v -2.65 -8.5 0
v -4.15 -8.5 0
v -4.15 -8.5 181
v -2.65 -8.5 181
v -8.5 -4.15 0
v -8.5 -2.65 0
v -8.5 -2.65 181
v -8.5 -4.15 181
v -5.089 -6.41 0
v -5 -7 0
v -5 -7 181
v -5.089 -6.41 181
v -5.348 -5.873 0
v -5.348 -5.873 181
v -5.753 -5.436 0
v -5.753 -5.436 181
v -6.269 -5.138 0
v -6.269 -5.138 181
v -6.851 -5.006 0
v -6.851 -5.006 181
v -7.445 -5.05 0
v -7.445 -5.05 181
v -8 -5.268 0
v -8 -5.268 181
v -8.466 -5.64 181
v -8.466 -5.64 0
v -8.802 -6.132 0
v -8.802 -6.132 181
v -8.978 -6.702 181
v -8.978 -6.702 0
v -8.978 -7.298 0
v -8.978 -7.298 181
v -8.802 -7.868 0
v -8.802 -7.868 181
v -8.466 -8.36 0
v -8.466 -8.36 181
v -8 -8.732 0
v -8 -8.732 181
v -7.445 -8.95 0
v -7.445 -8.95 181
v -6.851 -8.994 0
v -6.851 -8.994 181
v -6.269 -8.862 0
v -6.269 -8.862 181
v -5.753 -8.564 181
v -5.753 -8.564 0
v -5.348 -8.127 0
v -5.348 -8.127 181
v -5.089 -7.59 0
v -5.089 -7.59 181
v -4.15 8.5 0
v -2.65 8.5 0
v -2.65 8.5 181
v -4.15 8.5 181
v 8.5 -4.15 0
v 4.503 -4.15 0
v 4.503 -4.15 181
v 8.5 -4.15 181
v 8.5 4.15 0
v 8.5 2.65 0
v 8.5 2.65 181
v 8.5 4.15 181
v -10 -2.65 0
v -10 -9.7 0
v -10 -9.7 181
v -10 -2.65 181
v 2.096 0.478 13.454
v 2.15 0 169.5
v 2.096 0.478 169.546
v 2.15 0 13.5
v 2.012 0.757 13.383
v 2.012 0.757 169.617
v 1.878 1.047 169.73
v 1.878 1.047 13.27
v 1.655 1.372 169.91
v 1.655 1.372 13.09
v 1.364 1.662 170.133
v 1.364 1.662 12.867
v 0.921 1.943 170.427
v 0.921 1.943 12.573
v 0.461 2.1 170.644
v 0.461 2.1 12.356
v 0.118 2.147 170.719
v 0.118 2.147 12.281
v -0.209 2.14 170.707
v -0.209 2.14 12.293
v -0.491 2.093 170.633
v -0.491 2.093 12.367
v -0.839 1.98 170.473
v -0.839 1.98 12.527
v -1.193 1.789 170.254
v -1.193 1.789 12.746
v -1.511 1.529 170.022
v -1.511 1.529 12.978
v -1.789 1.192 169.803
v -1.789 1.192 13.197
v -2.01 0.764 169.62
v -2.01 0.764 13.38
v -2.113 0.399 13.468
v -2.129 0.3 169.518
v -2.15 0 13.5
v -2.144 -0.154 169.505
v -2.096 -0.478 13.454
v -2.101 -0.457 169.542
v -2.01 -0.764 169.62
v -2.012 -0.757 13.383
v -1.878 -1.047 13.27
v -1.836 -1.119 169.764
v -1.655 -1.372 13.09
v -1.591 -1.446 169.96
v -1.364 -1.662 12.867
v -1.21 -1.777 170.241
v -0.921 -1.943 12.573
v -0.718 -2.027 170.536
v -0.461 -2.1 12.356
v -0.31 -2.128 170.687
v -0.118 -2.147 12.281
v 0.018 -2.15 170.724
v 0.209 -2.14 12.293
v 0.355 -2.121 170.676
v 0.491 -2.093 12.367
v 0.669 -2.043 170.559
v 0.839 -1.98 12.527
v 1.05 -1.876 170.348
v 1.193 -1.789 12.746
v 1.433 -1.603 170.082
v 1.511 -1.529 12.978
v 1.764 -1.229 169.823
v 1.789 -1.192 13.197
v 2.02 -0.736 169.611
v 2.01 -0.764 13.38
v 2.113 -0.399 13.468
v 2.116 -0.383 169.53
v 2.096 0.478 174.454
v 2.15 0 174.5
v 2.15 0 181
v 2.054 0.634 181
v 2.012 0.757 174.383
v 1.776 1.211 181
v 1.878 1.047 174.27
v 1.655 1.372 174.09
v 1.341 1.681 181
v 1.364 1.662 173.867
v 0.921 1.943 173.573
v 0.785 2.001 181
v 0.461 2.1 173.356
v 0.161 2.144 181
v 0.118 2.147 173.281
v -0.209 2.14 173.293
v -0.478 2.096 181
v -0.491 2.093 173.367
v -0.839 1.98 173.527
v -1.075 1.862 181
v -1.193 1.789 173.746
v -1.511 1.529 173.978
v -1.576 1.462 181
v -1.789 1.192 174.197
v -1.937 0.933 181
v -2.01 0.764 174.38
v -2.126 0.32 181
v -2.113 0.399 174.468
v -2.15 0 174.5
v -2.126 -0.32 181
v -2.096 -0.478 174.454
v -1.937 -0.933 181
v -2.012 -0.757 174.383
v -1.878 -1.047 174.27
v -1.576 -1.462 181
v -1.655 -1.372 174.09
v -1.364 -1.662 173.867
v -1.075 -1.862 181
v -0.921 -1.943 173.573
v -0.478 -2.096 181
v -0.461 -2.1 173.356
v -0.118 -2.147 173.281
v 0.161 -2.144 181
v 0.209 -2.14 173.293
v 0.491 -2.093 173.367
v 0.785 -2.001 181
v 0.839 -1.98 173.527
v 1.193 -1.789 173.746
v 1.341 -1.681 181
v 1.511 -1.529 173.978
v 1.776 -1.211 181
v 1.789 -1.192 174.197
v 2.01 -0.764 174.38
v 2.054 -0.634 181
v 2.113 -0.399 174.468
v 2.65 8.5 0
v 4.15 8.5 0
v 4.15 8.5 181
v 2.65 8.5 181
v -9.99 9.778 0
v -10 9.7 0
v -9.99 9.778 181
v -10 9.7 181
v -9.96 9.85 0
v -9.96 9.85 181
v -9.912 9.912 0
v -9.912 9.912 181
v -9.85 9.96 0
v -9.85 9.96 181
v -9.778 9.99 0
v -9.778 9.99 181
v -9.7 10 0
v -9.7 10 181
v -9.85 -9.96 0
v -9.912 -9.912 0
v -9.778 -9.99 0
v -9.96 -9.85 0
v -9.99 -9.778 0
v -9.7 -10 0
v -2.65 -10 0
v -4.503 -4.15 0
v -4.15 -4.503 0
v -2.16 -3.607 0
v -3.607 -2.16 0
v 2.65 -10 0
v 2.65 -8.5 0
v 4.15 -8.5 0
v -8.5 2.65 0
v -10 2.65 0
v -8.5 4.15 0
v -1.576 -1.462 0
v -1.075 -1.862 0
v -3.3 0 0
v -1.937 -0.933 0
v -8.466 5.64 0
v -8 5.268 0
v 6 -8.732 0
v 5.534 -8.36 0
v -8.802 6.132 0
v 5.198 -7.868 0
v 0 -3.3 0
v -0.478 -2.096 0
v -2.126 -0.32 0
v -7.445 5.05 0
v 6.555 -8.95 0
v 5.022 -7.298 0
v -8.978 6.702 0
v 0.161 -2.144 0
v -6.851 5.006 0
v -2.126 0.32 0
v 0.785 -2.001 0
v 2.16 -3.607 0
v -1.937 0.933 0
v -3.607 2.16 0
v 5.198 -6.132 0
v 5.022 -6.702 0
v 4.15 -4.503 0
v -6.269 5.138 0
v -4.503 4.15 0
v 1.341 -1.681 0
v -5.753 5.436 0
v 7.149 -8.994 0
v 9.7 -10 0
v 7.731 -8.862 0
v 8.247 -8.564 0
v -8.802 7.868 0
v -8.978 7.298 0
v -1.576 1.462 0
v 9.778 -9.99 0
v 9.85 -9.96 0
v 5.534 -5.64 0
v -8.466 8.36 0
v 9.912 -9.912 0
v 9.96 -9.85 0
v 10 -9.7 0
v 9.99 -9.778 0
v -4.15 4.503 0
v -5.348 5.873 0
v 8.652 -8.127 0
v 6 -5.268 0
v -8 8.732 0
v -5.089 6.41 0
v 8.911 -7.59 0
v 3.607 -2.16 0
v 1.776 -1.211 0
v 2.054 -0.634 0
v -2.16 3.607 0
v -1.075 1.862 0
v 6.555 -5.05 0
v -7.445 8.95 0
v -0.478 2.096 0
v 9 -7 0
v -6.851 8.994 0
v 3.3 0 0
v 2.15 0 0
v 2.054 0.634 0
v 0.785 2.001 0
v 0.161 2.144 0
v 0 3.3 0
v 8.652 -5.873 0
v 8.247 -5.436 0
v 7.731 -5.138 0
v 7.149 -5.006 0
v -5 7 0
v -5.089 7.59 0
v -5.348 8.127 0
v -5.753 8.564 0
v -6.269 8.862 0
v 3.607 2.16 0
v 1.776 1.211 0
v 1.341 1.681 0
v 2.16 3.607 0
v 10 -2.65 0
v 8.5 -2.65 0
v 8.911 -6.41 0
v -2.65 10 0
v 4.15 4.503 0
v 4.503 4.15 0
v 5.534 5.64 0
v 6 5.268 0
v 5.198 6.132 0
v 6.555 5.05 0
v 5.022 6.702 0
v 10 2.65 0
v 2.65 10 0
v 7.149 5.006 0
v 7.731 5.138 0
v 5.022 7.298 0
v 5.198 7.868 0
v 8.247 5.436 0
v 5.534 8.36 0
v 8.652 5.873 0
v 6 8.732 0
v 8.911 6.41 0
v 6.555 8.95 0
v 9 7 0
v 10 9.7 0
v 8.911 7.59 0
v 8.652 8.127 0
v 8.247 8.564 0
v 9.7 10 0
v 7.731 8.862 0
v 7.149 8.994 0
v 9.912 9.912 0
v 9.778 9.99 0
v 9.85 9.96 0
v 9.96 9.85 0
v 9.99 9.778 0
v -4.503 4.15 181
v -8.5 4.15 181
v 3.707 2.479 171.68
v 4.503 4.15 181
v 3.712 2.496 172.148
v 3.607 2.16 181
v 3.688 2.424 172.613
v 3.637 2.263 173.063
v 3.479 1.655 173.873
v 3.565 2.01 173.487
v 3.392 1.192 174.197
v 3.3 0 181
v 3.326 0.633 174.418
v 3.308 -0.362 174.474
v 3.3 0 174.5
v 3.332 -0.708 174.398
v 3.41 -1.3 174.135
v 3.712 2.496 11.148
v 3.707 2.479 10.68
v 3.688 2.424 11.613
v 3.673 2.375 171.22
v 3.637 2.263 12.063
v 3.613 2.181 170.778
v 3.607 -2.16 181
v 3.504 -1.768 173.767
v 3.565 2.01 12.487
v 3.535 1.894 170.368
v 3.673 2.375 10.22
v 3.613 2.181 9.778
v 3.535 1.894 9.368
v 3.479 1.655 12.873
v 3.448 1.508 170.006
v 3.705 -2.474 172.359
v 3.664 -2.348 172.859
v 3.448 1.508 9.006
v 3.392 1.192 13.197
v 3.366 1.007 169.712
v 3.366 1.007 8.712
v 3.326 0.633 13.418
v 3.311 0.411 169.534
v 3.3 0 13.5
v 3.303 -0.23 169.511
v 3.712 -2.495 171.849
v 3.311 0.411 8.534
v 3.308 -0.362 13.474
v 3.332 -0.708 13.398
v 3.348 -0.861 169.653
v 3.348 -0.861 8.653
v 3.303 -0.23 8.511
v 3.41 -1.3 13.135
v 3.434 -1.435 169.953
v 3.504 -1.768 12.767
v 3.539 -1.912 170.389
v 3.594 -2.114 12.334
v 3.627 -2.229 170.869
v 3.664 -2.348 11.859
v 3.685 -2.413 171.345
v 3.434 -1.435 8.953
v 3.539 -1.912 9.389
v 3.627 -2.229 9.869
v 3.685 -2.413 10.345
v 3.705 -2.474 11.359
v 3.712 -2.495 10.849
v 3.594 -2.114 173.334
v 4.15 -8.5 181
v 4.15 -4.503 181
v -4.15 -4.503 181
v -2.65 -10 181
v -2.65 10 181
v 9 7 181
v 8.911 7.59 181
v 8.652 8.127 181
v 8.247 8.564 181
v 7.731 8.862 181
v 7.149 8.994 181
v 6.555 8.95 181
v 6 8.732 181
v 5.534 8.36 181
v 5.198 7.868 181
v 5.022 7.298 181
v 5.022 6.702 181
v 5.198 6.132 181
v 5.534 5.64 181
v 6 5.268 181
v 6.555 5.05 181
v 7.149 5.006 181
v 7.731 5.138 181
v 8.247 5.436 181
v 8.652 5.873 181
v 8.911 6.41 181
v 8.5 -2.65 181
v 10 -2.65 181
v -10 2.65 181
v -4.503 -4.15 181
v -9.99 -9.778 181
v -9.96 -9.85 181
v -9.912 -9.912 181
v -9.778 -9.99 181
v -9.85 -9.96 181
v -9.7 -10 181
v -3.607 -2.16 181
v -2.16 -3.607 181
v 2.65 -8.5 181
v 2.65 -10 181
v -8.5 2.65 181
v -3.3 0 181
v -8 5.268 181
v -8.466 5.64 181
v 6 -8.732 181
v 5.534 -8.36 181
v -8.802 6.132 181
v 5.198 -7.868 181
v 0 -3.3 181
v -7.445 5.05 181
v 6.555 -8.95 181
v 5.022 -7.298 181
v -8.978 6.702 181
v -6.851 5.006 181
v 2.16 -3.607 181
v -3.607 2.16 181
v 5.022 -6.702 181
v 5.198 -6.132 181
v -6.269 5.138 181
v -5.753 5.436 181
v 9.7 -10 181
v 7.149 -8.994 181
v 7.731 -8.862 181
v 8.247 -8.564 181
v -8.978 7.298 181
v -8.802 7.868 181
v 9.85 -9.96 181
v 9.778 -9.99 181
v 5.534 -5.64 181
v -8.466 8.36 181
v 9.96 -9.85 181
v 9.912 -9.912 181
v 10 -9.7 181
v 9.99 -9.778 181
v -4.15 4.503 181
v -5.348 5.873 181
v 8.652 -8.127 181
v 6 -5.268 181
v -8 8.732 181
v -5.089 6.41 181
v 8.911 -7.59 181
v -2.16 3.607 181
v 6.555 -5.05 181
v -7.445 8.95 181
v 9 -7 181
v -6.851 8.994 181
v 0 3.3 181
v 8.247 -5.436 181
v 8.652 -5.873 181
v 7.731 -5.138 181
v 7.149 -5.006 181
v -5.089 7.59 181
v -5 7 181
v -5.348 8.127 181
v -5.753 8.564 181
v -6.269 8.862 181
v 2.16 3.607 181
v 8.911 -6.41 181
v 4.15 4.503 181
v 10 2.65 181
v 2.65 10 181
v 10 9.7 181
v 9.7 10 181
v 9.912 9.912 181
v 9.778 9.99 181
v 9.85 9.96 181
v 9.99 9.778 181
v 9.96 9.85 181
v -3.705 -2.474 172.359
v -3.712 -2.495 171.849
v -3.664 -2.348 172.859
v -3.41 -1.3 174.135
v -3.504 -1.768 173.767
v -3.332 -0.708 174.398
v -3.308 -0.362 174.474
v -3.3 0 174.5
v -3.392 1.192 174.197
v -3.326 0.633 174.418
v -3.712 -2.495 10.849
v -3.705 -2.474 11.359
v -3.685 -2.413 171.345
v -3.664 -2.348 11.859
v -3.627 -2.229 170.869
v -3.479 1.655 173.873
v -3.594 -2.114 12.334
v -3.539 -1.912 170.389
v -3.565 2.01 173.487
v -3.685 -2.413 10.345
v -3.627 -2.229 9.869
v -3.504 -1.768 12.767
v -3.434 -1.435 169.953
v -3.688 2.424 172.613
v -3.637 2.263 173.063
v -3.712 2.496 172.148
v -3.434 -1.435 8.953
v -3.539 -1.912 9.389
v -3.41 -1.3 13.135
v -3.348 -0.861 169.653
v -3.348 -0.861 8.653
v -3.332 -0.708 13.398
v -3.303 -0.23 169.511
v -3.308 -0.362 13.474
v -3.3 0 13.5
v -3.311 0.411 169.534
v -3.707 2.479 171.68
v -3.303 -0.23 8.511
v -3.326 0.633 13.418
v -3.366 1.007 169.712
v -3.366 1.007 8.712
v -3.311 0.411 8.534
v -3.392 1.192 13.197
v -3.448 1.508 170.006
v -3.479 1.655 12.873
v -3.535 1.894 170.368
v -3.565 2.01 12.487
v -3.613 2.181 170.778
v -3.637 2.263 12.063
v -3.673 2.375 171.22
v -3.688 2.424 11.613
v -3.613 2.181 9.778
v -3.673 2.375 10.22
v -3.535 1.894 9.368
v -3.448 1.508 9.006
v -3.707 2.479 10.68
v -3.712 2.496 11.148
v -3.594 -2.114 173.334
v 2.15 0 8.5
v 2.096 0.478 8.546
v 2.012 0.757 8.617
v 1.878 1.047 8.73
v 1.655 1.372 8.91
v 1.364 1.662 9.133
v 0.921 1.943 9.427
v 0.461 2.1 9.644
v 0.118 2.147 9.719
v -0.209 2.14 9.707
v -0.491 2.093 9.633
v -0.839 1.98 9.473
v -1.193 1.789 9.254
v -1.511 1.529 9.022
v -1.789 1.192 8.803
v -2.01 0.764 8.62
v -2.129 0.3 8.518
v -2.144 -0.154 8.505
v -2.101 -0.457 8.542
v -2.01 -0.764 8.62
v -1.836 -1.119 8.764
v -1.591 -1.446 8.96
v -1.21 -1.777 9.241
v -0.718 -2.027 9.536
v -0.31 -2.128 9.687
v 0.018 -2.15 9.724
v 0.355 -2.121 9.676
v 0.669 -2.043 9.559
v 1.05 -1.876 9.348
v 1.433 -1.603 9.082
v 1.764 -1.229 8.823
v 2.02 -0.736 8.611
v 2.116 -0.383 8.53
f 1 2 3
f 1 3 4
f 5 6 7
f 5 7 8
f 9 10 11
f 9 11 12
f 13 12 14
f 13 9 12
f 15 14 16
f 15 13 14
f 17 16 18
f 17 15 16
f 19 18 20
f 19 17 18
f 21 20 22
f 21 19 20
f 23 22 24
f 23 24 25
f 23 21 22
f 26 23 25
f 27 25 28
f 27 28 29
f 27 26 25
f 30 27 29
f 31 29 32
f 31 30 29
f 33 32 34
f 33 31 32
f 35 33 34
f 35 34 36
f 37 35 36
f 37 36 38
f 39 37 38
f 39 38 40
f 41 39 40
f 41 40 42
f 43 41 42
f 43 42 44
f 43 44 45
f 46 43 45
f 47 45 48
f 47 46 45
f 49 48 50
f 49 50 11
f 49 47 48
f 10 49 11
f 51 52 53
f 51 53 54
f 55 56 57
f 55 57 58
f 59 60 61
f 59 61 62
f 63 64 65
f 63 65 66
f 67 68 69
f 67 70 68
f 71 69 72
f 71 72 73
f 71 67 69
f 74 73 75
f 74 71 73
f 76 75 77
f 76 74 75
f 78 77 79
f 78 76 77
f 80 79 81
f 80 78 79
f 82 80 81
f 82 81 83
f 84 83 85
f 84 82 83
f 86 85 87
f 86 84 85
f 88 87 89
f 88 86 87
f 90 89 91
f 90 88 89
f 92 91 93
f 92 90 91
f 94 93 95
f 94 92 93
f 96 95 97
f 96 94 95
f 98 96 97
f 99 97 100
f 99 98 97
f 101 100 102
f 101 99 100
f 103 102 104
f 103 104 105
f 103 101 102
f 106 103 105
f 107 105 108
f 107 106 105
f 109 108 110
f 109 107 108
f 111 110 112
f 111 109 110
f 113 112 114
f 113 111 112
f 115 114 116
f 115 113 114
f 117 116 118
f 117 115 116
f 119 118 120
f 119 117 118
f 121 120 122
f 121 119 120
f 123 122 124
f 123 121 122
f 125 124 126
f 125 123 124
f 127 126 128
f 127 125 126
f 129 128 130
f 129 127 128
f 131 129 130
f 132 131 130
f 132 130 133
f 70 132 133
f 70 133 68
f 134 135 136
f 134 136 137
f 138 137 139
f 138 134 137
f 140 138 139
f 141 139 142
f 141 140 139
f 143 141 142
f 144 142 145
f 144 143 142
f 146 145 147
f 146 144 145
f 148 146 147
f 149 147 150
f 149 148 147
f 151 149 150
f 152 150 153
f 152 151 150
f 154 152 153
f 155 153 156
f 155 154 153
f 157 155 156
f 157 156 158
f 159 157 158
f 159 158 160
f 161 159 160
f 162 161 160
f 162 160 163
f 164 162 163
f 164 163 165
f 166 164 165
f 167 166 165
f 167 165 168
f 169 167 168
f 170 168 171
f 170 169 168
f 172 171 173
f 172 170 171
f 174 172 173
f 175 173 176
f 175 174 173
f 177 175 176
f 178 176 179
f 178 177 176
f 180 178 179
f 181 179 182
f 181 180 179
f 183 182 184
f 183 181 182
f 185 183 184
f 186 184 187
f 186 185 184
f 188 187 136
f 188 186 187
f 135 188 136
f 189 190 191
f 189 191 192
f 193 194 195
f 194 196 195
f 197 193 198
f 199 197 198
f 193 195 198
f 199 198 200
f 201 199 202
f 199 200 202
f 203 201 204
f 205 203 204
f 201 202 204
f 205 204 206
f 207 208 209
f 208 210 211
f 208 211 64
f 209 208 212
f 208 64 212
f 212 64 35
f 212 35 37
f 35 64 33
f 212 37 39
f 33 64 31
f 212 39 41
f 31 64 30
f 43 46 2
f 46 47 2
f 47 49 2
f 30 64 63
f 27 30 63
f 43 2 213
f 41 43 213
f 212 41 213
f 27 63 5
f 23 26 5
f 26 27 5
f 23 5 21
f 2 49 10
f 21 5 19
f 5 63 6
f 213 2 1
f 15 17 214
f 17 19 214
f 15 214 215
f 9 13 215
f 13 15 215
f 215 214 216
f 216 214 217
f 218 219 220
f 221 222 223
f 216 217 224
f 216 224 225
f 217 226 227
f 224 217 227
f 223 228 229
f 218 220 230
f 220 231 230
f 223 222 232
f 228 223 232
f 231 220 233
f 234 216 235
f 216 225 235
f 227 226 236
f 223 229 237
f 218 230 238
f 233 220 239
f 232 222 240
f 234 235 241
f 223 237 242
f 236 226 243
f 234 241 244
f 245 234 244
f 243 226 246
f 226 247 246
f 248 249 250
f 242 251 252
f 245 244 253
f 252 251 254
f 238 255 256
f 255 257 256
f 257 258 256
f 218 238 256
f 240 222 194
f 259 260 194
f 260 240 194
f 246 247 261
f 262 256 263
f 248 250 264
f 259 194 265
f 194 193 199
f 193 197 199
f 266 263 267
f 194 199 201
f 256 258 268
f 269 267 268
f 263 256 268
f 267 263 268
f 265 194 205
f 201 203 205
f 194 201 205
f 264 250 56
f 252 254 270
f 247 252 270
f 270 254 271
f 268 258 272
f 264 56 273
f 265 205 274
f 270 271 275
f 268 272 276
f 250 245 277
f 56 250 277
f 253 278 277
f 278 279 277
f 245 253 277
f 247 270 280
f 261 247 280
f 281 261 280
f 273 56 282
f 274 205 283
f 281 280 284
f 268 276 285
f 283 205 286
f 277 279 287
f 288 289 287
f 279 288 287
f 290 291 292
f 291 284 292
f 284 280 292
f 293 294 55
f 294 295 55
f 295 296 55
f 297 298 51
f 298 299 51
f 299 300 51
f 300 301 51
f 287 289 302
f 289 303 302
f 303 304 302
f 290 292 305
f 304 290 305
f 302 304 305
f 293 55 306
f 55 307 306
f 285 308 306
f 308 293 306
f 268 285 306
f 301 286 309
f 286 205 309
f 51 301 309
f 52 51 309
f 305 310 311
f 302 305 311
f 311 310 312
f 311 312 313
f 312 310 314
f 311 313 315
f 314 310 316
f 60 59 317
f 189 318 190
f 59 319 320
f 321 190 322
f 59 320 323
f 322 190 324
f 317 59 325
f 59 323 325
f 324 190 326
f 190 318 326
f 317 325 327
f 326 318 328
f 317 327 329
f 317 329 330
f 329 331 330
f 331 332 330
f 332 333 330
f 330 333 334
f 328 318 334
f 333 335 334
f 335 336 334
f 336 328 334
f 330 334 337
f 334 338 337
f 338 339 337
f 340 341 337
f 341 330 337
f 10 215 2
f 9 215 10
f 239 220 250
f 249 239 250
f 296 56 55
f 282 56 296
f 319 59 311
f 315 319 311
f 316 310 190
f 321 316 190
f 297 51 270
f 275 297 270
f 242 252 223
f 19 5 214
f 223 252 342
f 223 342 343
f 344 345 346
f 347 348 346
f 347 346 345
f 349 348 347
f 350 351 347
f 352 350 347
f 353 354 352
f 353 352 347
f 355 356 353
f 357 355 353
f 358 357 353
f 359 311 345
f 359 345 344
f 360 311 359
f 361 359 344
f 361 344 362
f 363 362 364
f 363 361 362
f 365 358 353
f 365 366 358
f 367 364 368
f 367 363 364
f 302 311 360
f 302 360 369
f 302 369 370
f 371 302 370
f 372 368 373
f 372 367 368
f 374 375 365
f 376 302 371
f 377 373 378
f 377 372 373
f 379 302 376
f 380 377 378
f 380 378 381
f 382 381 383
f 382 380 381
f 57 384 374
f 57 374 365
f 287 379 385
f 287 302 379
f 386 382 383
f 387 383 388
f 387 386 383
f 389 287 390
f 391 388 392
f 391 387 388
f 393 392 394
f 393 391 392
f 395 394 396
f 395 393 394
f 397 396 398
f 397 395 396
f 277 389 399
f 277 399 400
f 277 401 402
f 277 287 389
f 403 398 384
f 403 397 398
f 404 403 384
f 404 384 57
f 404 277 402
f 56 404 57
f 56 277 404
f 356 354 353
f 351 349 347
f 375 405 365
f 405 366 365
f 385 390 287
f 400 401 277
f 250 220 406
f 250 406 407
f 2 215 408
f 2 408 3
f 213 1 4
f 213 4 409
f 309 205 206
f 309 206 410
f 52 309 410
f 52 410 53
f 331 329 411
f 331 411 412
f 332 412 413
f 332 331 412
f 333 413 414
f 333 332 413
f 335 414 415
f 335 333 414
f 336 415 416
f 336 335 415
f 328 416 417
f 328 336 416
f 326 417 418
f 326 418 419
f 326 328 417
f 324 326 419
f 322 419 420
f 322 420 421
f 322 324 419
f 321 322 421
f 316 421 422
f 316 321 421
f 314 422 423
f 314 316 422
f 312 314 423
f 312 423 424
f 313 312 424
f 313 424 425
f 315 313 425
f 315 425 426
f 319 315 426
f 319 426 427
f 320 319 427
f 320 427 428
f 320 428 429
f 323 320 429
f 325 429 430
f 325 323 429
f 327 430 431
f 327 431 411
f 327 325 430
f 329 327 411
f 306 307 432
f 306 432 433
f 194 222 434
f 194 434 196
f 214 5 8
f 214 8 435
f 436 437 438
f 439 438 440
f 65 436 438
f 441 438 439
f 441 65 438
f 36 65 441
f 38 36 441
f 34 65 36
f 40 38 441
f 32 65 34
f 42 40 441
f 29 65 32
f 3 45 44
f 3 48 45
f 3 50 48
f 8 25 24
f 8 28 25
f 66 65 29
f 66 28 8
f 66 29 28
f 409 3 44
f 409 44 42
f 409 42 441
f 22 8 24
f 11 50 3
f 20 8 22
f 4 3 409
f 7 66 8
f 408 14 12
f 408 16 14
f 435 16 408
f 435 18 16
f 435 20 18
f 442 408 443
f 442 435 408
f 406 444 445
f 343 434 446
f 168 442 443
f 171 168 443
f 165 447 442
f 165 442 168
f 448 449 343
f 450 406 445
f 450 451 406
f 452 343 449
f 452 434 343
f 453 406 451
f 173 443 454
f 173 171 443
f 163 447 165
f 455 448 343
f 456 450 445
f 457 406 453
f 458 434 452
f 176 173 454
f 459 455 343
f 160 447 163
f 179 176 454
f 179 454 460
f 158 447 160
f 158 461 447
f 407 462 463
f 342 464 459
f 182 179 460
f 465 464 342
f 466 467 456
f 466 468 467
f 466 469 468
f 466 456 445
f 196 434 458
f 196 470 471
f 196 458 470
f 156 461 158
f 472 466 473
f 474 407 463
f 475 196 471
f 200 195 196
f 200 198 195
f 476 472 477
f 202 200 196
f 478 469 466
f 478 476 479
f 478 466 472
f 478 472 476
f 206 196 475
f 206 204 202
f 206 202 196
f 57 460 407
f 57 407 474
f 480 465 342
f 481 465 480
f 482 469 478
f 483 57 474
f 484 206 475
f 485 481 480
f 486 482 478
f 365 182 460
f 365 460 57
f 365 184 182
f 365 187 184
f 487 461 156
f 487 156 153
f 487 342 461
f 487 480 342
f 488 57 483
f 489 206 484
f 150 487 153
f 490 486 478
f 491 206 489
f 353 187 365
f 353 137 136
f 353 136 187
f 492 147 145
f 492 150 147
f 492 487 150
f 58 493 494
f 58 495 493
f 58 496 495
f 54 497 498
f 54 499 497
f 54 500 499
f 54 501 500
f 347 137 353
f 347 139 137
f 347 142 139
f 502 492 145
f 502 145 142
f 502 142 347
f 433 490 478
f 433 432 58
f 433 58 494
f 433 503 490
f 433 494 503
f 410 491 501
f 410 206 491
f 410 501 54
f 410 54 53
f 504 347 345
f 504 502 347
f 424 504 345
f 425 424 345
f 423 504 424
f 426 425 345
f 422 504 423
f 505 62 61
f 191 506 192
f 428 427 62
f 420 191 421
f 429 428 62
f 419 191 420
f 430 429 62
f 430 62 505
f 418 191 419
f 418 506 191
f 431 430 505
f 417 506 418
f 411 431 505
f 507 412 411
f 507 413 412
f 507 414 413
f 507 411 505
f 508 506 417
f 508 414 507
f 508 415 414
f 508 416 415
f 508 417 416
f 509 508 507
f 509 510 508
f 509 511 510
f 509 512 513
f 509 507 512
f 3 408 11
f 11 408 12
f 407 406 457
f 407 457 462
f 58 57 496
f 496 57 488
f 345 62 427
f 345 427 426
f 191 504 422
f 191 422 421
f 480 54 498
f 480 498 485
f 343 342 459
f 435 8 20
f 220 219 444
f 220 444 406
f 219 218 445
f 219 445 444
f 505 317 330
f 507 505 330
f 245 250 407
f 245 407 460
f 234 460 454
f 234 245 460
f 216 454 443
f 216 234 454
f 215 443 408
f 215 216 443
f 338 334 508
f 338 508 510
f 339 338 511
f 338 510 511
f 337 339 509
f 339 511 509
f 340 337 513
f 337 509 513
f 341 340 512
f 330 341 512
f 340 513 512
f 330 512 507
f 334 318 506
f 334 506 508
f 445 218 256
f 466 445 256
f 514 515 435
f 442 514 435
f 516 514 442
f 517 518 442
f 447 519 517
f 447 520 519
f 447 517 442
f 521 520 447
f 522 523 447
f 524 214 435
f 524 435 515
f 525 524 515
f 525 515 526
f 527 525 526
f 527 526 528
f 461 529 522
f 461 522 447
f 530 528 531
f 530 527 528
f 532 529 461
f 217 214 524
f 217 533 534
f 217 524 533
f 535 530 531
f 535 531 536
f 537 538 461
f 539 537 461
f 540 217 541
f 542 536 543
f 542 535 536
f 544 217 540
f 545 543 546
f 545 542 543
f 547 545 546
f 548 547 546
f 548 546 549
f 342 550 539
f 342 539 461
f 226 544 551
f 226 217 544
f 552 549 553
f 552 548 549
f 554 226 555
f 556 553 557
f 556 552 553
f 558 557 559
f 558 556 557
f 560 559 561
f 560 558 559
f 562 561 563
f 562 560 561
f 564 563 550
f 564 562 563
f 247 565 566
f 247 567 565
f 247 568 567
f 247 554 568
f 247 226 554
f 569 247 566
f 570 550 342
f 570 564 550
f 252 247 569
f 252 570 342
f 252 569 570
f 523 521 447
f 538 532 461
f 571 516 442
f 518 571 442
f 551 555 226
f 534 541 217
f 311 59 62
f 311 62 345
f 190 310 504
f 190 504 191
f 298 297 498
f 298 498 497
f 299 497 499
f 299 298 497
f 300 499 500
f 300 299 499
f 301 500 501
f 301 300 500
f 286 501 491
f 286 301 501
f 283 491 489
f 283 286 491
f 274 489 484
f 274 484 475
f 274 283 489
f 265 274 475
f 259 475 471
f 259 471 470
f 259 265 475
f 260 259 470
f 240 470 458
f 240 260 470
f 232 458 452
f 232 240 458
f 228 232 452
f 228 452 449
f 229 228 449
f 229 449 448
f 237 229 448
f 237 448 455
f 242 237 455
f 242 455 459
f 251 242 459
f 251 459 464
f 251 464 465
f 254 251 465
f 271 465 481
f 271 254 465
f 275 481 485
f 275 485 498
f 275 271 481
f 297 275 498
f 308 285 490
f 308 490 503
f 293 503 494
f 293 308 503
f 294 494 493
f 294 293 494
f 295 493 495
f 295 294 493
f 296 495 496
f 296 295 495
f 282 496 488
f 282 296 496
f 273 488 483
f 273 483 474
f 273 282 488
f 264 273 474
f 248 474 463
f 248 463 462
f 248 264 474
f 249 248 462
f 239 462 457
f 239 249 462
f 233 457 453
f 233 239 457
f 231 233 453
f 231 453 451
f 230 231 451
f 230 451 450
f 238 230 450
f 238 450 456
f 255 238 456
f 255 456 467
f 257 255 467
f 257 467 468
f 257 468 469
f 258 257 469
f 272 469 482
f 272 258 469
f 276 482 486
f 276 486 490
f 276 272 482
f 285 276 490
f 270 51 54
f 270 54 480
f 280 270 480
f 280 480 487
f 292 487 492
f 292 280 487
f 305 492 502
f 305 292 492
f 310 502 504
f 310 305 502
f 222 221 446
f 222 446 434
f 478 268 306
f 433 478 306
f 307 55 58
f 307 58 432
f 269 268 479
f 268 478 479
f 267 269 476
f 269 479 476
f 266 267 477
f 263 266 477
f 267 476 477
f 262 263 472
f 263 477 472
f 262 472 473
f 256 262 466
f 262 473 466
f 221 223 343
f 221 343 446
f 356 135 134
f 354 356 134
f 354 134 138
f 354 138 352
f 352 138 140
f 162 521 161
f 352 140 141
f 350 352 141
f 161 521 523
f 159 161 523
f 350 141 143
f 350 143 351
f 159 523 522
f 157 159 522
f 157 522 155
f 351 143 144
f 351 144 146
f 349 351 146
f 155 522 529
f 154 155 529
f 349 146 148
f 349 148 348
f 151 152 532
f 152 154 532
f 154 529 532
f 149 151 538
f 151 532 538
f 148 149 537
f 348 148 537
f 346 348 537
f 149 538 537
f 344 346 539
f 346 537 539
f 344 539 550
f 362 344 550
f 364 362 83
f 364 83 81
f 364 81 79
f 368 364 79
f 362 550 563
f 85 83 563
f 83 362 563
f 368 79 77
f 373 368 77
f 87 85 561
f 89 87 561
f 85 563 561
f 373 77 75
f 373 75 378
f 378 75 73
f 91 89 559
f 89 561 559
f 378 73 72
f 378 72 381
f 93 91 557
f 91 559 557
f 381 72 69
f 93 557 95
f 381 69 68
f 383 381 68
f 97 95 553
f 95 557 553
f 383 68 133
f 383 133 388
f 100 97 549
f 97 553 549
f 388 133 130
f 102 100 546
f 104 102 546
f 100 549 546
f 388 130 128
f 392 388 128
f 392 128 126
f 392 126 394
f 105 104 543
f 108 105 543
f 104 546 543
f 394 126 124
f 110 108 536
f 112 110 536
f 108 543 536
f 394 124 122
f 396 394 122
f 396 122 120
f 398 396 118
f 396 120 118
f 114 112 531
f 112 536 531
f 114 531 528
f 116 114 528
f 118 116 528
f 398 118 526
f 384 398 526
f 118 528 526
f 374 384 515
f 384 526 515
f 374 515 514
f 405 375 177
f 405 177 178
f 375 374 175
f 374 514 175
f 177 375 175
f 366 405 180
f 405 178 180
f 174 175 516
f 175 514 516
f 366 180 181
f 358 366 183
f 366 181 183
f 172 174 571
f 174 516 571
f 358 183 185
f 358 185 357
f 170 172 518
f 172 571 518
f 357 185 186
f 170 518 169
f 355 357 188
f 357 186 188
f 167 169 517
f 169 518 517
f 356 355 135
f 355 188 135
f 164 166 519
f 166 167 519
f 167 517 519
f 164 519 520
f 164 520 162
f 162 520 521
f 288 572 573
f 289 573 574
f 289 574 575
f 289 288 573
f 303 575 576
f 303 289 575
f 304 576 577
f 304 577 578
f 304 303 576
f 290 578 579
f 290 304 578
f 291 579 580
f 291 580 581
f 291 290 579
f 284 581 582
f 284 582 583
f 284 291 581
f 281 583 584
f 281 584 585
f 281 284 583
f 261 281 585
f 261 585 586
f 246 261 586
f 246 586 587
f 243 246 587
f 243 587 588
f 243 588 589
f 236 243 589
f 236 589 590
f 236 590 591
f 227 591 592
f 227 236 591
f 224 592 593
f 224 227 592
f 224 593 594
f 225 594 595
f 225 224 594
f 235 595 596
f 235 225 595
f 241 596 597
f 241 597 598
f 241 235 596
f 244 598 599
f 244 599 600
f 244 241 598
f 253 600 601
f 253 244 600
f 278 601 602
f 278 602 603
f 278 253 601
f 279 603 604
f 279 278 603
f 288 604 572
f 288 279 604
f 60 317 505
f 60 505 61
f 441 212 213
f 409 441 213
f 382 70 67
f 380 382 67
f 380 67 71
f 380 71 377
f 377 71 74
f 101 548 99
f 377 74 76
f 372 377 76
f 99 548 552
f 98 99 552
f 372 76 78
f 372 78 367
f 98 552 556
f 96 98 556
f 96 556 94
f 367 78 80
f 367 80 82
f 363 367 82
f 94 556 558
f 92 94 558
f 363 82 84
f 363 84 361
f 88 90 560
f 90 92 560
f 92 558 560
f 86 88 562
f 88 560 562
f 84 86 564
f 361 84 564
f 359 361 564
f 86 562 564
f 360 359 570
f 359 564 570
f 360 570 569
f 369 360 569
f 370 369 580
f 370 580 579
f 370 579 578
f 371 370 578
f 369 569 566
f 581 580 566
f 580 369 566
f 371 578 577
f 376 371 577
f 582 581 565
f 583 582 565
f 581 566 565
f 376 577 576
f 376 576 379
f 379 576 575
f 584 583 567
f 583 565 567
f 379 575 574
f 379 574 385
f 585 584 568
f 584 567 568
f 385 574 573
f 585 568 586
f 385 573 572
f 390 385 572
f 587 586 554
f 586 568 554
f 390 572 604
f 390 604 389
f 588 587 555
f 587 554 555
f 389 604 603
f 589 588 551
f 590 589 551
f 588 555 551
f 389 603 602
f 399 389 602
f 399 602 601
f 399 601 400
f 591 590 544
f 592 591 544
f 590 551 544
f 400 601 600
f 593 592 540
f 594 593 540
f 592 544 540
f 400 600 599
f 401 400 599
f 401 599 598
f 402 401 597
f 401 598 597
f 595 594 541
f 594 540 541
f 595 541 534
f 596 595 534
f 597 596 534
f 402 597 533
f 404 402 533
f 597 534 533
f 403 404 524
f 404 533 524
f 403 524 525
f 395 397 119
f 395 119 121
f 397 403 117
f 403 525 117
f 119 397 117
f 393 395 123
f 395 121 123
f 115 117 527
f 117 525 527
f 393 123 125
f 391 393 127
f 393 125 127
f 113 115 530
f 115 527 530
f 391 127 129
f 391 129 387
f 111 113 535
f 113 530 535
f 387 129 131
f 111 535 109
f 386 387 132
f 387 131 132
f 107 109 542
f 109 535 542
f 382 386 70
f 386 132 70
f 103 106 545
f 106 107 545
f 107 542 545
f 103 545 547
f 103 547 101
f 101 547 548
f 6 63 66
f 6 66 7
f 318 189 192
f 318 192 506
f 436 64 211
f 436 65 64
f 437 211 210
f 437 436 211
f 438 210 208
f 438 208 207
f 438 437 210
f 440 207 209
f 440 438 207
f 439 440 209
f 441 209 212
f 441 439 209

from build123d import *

# Parameters (mm, degrees)
SKETCH_1_W               = 20
SKETCH_1_H               = 20
SKETCH_1_R               = 2
SKETCH_1_R_2             = 2.15
EXTRUDE_1_DEPTH          = 181
CUT_EXTRUDE_1_REACH      = 183.552
PATTERN_CIRCULAR_1_COUNT = 4
FILLET_1_R               = 0.3
SKETCH_2_R               = 2.5
CUT_EXTRUDE_2_DEPTH      = 183.375985261


with BuildPart() as part:
    # 스케치1 → 보스-돌출1 (new body)
    with BuildSketch(Plane.XY):
        Rectangle(SKETCH_1_W, SKETCH_1_H)
        with Locations((-7, -7)):
            Circle(SKETCH_1_R, mode=Mode.SUBTRACT)
        with Locations((7, -7)):
            Circle(SKETCH_1_R, mode=Mode.SUBTRACT)
        with Locations((-7, 7)):
            Circle(SKETCH_1_R, mode=Mode.SUBTRACT)
        Circle(SKETCH_1_R_2, mode=Mode.SUBTRACT)
        with Locations((7, 7)):
            Circle(SKETCH_1_R, mode=Mode.SUBTRACT)
    extrude(amount=EXTRUDE_1_DEPTH)

    # 스케치1<3> → 컷-돌출1 (cut, up to next)
    with BuildSketch(Plane.XY, mode=Mode.PRIVATE) as cut_extrude_1_sk1:
        with BuildLine():
            Line((-8.5, 2.65), (-10, 2.65))
            Line((-10, 2.65), (-10, -2.65))
            Line((-10, -2.65), (-8.5, -2.65))
            Line((-8.5, -2.65), (-8.5, -4.15))
            Line((-8.5, -4.15), (-4.503166667, -4.15))
            ThreePointArc((-4.503166667, -4.15), (-3.3, 0), (-4.503166667, 4.15))
            Line((-4.503166667, 4.15), (-8.5, 4.15))
            Line((-8.5, 4.15), (-8.5, 2.65))
        make_face()
    cut_extrude_1_tool1 = extrude(cut_extrude_1_sk1.sketch, amount=CUT_EXTRUDE_1_REACH, mode=Mode.PRIVATE) & part.part
    cut_extrude_1 = cut_extrude_1_tool1.solids().sort_by_distance((-6.606913, 0, 0))[0]
    add(cut_extrude_1, mode=Mode.SUBTRACT)

    # 원형 패턴1: 컷-돌출1 ×4 about axis
    pattern_circular_1_axis = Axis((0, 0, 181), (0, 0, -1))
    for i in range(1, PATTERN_CIRCULAR_1_COUNT):
        add(cut_extrude_1.rotate(pattern_circular_1_axis, i * 360 / PATTERN_CIRCULAR_1_COUNT), mode=Mode.SUBTRACT)

    # 필렛1
    fillet_1_edges = [part.edges().sort_by_distance(p)[0] for p in [
        (10, -10, 90.5),
        (-10, -10, 90.5),
        (-10, 10, 90.5),
        (10, 10, 90.5),
    ]]
    fillet(fillet_1_edges, radius=FILLET_1_R)

    # 스케치2 → 컷-돌출2 (cut, through all)
    with BuildSketch(Plane.ZY.offset(10)):
        with Locations((11, 0)):
            Circle(SKETCH_2_R)
        with Locations((172, 0)):
            Circle(SKETCH_2_R)
    extrude(amount=-CUT_EXTRUDE_2_DEPTH, mode=Mode.SUBTRACT)


solid = part.part
